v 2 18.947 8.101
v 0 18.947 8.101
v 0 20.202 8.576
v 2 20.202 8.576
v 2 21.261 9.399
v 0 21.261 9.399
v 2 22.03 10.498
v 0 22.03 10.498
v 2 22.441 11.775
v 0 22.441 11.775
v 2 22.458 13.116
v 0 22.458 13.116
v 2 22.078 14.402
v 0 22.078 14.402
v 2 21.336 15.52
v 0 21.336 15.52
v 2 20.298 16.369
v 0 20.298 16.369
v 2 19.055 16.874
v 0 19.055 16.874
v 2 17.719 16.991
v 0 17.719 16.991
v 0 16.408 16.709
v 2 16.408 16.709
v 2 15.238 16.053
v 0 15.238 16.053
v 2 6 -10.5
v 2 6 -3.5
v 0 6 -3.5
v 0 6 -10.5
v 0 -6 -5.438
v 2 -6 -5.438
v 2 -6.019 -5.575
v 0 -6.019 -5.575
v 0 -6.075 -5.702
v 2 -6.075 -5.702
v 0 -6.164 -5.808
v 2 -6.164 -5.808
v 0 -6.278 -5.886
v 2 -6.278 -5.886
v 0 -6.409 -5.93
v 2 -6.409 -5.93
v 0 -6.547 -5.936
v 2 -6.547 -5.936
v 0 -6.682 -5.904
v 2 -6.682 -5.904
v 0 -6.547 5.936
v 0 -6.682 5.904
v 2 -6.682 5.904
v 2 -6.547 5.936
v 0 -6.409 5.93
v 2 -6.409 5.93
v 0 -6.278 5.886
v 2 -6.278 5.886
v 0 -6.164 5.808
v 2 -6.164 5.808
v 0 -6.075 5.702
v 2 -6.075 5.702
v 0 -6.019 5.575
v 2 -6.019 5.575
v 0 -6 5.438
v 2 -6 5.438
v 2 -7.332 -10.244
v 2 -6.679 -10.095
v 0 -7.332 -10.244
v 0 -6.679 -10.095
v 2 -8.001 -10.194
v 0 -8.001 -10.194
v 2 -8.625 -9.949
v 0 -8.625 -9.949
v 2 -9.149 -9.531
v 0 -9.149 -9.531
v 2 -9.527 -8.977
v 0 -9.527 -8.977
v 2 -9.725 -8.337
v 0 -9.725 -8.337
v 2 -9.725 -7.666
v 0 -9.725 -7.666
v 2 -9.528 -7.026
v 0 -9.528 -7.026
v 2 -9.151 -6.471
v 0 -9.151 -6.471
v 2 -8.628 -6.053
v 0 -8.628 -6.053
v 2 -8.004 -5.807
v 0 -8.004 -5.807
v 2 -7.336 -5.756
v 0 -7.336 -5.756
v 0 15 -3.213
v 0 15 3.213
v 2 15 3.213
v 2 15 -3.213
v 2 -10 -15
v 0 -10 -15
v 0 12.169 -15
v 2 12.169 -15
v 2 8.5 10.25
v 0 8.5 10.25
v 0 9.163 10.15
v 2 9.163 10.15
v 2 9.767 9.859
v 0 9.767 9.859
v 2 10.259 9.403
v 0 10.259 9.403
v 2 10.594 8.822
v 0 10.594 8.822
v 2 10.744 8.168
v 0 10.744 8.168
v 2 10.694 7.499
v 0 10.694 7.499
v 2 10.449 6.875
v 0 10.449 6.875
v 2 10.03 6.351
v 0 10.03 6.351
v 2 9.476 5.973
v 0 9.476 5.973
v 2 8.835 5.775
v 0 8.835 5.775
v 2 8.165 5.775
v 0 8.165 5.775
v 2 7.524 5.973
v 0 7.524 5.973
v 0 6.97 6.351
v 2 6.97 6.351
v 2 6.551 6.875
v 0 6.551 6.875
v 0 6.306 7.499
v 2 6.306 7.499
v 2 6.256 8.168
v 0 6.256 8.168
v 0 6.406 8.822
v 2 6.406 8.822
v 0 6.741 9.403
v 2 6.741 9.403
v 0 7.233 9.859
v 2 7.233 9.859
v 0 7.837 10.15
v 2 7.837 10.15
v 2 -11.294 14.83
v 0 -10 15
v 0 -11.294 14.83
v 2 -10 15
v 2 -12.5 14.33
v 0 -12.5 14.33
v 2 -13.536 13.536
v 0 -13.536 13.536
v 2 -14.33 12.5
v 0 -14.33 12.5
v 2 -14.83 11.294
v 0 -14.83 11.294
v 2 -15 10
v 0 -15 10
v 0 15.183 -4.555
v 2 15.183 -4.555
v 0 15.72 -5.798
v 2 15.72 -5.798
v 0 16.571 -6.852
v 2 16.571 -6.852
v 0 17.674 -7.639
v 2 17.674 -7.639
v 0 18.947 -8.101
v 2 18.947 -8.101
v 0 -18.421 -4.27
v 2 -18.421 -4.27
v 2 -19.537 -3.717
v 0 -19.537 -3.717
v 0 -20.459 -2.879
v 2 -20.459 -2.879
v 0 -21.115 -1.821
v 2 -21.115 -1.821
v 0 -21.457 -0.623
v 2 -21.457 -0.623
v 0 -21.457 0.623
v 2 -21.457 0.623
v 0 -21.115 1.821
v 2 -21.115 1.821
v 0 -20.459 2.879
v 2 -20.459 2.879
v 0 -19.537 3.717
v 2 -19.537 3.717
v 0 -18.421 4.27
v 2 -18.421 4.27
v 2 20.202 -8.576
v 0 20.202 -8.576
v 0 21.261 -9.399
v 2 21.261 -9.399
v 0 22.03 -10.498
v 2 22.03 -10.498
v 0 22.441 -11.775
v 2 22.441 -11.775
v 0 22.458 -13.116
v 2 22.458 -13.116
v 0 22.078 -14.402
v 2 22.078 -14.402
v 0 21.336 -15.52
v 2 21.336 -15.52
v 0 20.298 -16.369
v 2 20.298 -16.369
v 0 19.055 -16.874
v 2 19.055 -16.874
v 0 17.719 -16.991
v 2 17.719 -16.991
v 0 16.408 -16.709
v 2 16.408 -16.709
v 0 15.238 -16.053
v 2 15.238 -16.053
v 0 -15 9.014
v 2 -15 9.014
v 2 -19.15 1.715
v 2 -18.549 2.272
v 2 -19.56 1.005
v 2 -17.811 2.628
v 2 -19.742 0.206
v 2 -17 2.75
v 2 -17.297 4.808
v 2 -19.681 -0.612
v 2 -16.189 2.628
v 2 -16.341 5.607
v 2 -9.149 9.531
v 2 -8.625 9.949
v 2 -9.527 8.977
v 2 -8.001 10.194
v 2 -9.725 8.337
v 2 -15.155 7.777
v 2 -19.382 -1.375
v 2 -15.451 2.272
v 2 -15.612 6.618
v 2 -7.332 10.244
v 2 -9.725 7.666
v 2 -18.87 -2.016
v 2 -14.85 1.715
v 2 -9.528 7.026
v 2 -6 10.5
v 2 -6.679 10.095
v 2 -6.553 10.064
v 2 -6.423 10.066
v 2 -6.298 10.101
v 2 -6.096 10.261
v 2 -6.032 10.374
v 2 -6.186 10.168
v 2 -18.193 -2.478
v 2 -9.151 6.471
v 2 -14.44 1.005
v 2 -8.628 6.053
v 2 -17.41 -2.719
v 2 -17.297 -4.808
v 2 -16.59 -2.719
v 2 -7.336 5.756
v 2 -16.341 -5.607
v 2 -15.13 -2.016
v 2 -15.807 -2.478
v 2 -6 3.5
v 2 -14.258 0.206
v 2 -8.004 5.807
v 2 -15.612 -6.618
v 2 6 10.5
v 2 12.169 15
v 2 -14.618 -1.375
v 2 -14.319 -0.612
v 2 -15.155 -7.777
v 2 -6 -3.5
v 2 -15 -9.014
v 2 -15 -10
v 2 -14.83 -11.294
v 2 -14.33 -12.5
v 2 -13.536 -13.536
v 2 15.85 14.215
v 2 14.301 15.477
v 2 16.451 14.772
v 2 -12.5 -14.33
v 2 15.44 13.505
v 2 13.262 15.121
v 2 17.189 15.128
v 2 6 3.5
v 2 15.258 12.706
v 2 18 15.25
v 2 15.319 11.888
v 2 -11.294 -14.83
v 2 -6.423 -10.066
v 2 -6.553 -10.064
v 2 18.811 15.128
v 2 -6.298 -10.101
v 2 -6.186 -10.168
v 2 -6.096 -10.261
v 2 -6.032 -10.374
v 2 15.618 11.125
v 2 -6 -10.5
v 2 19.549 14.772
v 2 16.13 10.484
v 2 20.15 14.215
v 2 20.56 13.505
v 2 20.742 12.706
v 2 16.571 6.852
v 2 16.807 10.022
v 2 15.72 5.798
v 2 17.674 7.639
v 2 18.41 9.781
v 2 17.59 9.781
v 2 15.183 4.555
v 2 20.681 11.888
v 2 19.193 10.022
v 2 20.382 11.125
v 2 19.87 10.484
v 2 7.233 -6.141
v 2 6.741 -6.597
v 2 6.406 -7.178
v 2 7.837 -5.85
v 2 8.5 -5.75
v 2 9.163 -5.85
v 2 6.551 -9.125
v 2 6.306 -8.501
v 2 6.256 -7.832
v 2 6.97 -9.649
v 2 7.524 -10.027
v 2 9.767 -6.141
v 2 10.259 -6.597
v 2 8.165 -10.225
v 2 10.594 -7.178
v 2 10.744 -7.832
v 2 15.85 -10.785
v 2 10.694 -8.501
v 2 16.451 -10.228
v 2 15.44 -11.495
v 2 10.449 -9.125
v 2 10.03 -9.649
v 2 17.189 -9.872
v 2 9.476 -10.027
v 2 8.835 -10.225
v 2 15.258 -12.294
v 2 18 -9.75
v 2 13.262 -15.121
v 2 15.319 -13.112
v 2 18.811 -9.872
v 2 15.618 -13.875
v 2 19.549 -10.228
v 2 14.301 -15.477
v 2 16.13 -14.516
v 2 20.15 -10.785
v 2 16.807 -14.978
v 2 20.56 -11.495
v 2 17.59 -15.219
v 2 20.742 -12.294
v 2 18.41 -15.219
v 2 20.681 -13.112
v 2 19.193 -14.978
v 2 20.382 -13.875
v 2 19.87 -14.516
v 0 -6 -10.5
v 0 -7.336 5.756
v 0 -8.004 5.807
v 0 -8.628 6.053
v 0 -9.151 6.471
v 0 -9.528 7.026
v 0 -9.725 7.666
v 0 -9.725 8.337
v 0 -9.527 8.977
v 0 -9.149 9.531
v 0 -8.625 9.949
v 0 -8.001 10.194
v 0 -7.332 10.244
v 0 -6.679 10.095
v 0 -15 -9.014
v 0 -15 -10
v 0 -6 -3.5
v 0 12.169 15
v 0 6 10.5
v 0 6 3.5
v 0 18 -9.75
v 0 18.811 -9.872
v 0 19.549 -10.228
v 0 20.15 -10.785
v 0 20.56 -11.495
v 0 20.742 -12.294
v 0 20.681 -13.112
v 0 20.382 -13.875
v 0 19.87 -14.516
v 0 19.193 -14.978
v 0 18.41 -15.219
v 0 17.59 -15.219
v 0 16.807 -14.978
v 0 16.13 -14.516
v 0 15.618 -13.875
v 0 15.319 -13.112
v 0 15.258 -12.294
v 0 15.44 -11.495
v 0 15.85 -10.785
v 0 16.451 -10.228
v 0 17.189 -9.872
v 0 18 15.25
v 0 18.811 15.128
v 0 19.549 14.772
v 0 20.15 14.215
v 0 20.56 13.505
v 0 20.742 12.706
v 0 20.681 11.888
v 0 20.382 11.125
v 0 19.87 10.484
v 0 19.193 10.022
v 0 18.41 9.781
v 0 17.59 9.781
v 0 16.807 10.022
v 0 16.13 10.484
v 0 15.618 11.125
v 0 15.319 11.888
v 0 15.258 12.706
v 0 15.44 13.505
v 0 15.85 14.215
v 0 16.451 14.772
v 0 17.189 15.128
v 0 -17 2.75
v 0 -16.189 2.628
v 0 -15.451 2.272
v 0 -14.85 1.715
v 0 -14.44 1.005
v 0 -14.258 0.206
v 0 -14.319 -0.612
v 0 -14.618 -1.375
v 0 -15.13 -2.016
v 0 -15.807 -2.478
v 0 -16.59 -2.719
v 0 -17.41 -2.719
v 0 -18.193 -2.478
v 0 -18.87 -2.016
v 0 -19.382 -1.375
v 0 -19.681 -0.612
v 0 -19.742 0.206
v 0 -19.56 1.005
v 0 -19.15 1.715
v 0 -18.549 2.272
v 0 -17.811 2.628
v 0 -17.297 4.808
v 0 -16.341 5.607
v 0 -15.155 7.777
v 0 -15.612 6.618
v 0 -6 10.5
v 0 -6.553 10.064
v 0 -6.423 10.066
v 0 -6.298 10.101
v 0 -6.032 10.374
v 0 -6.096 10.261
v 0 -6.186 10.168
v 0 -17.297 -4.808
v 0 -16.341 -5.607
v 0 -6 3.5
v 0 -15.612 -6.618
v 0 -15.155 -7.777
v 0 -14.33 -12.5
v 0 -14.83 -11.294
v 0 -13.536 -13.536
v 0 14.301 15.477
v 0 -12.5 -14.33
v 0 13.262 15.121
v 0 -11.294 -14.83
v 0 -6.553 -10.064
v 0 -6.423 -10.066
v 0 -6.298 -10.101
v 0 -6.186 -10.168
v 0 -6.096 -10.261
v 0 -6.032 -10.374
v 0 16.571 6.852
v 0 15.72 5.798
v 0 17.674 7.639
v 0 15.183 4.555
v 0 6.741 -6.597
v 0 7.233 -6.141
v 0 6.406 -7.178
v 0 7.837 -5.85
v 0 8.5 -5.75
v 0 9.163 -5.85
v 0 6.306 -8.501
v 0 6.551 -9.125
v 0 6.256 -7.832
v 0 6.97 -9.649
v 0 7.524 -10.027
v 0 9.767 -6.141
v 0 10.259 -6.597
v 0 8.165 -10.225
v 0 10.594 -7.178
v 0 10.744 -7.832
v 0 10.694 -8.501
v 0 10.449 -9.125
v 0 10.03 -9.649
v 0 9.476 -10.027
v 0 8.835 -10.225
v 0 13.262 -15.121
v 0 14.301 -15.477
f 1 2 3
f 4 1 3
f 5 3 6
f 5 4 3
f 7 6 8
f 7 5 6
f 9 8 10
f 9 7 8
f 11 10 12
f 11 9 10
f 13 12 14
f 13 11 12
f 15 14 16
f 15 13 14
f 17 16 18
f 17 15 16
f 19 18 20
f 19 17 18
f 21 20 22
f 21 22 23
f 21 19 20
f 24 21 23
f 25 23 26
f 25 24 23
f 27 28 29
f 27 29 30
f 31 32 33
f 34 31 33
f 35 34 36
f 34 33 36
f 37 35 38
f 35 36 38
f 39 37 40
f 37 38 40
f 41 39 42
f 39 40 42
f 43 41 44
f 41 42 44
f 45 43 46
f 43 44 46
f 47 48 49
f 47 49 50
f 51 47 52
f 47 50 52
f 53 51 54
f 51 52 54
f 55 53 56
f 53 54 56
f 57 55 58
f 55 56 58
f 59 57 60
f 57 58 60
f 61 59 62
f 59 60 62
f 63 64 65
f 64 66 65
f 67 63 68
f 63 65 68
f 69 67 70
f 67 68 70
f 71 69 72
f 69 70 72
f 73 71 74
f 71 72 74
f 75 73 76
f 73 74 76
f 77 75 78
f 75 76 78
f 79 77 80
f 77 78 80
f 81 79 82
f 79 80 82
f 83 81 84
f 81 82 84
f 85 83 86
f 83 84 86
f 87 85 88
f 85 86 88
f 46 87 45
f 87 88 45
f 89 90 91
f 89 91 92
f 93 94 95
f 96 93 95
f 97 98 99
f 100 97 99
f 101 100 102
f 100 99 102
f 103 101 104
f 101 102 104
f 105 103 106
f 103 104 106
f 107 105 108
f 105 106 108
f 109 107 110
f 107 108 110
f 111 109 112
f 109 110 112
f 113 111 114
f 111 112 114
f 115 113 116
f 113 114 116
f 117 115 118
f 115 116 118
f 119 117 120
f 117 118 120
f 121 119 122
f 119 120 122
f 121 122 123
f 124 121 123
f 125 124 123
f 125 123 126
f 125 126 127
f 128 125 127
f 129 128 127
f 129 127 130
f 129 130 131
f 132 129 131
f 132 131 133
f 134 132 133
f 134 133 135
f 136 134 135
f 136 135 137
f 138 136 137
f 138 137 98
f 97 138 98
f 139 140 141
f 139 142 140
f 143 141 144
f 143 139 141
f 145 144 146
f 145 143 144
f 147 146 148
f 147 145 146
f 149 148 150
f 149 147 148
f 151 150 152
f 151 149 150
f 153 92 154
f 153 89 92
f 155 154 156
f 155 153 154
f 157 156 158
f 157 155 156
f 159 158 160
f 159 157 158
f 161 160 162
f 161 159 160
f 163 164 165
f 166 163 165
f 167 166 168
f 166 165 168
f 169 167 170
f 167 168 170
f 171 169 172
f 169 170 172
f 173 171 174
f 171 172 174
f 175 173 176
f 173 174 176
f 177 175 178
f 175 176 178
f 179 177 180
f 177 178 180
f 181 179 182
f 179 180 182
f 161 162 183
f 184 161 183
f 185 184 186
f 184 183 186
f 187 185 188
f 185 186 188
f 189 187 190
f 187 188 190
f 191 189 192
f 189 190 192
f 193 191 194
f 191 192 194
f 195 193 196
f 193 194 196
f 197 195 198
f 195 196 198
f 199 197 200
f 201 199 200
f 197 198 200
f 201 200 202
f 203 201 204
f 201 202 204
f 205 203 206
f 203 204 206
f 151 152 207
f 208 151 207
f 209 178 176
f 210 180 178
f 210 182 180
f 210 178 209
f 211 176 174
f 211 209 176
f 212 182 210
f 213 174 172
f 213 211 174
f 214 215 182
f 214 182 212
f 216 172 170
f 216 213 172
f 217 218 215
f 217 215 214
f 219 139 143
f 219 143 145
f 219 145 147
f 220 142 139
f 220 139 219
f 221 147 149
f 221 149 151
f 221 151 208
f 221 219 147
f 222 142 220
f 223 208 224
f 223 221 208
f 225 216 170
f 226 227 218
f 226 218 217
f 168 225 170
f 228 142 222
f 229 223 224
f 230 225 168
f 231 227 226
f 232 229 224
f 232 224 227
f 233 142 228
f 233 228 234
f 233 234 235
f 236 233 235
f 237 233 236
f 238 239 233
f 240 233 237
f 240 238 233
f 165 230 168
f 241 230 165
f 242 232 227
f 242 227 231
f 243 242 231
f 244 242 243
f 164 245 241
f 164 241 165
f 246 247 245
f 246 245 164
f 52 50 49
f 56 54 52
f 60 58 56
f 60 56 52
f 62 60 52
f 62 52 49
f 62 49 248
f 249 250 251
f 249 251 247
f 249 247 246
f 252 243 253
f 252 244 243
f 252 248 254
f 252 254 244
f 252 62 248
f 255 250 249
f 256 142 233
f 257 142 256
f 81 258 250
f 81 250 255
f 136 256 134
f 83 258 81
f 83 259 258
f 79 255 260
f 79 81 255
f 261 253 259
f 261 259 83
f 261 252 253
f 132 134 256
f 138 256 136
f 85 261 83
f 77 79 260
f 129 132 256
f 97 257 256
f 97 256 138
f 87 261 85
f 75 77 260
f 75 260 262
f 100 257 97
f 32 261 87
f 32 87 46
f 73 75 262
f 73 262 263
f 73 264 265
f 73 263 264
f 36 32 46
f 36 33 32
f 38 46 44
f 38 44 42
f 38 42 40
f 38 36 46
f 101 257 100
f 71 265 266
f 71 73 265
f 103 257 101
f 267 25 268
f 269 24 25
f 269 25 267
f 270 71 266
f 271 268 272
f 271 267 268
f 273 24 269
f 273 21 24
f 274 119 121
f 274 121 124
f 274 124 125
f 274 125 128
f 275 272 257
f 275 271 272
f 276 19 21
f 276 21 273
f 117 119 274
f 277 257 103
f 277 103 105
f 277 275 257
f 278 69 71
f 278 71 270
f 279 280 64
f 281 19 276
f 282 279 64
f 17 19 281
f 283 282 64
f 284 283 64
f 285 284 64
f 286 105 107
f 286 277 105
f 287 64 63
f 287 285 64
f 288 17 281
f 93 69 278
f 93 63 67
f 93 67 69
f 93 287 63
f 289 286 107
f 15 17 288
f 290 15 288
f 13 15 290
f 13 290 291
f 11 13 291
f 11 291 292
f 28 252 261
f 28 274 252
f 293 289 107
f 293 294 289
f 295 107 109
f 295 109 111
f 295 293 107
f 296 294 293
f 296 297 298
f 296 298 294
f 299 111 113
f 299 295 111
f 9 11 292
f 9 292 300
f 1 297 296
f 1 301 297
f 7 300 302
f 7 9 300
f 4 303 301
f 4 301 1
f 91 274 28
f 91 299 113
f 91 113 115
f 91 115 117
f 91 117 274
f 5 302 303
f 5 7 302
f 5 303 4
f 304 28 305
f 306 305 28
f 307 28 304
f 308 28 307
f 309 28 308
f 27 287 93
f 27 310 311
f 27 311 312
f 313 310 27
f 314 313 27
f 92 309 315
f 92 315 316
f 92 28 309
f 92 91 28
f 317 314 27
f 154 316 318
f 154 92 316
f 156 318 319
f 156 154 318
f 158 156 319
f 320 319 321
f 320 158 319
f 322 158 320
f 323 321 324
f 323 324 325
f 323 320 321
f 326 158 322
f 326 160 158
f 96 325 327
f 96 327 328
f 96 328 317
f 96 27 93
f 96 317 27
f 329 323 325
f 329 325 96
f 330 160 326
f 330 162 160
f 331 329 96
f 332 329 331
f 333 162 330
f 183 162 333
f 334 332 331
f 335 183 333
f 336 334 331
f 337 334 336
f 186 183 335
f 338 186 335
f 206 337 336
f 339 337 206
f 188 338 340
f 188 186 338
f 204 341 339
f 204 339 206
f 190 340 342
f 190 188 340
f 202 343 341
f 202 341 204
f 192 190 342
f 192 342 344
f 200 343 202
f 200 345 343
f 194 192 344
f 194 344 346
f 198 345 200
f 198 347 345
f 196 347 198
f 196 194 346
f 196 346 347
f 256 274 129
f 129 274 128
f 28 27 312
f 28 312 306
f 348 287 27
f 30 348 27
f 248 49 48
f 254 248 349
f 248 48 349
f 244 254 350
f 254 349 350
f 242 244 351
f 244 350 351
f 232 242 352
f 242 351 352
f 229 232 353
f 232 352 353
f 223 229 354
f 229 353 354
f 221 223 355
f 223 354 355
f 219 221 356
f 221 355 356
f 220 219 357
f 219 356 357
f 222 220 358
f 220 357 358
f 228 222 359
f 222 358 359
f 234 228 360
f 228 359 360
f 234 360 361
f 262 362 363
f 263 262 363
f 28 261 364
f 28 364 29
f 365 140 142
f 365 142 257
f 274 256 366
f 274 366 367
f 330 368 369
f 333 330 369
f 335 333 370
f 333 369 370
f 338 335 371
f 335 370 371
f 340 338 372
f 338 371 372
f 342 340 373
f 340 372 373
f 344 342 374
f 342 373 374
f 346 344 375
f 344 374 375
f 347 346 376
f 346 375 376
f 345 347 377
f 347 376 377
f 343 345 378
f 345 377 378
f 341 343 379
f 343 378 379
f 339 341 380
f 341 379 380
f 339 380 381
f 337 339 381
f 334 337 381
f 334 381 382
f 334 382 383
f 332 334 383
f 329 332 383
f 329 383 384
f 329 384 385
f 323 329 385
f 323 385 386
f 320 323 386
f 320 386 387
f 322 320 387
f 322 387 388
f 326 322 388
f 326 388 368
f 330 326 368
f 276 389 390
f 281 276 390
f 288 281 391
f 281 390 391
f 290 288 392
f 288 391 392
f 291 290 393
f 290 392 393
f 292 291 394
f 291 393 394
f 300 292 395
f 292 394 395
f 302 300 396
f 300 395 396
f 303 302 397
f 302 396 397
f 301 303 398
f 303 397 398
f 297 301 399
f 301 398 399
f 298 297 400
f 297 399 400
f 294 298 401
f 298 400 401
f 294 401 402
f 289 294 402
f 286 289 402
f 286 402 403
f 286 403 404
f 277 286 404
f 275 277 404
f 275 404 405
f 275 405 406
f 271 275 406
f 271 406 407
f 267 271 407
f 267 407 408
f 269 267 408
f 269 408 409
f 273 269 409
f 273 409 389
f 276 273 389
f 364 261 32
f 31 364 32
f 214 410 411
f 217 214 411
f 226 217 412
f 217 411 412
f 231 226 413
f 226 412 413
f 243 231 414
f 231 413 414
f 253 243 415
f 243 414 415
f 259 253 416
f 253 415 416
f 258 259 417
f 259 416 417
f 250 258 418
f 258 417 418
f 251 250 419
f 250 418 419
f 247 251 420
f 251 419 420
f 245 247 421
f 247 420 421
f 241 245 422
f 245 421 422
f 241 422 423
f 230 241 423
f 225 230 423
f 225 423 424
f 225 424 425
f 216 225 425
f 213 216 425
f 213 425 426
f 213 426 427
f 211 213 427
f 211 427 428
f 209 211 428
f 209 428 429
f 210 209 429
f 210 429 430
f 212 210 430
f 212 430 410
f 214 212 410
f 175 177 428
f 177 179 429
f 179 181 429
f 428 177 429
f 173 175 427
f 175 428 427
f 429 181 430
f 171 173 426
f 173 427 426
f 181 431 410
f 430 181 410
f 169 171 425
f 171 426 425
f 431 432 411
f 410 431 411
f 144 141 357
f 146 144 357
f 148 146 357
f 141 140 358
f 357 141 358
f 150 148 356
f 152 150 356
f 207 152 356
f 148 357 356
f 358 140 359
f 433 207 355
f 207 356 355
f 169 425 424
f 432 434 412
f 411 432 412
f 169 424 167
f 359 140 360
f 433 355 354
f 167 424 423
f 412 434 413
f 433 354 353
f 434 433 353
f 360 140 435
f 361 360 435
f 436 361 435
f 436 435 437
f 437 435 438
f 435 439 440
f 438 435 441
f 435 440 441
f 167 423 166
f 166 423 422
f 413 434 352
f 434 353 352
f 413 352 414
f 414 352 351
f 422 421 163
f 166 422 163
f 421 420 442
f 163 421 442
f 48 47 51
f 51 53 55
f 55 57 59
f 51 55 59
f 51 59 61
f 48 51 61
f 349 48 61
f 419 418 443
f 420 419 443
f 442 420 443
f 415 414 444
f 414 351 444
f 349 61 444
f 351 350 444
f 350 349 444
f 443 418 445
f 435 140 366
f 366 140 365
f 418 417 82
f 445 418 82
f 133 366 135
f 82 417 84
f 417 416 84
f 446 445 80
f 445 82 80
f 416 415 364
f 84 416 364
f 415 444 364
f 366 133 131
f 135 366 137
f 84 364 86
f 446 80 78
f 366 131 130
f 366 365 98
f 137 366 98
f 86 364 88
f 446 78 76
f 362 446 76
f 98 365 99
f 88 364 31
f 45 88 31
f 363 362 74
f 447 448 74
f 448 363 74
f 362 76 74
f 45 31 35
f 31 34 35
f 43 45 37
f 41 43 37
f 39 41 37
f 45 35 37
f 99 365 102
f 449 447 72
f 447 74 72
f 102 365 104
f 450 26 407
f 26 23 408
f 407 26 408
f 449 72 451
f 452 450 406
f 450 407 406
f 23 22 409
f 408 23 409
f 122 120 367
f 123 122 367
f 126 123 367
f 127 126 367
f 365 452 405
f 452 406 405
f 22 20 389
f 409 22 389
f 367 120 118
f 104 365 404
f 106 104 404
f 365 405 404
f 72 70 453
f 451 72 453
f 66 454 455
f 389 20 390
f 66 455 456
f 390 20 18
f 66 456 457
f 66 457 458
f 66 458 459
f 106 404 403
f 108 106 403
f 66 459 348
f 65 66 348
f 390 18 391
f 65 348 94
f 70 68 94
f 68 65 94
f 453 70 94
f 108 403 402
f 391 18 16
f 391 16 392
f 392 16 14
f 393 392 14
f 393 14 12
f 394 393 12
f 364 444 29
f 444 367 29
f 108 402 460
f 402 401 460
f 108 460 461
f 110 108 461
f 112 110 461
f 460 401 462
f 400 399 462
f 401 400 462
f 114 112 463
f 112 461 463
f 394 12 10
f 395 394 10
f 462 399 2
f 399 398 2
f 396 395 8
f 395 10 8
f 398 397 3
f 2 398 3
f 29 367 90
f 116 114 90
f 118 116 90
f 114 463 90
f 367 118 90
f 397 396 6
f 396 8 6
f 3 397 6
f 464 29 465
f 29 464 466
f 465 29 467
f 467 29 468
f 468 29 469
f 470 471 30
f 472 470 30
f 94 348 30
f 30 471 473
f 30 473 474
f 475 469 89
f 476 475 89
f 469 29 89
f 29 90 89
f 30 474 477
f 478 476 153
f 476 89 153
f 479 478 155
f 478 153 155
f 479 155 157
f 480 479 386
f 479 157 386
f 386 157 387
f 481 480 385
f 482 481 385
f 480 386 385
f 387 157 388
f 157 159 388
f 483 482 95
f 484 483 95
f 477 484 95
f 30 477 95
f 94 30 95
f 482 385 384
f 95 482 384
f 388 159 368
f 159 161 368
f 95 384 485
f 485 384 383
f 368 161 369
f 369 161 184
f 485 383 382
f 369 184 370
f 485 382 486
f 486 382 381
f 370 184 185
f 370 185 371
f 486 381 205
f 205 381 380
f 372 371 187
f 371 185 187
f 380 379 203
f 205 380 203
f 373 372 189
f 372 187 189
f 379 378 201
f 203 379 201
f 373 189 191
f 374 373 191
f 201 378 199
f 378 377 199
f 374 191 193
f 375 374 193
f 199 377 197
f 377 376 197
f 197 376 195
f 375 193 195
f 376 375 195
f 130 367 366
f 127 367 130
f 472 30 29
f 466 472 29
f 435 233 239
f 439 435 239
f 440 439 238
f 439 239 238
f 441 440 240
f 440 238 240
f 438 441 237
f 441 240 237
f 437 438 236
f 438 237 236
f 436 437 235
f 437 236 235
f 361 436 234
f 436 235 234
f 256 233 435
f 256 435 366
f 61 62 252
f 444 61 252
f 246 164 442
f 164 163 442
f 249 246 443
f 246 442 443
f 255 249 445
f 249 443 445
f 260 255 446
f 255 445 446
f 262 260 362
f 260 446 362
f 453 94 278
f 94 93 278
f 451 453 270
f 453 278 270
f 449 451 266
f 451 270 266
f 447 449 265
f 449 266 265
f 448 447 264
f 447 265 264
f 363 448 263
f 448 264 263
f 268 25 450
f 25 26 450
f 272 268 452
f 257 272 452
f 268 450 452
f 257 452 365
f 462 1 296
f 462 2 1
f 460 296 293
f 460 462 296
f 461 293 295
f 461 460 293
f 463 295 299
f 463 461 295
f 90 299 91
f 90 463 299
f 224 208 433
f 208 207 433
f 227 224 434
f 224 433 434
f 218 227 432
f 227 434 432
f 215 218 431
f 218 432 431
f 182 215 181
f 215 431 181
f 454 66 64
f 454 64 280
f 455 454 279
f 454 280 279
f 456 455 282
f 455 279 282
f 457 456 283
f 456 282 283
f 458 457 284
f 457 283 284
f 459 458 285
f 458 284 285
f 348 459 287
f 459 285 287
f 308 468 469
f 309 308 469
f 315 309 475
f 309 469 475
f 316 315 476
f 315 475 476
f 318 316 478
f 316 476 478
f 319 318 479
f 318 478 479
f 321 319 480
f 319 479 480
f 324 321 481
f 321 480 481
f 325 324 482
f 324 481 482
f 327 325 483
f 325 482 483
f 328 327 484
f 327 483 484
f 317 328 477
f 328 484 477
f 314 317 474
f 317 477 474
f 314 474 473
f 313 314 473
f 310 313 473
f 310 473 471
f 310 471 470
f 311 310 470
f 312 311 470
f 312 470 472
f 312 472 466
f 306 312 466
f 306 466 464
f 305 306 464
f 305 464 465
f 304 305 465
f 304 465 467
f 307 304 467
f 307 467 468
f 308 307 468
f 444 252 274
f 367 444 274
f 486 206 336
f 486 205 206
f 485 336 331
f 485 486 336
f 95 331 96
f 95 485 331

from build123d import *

# Parameters (mm, degrees)
SKETCH1_W            = 30
SKETCH1_H            = 30
BOSS_EXTRUDE1_DEPTH  = 2
SKETCH2_W            = 7
SKETCH2_H            = 12
CUT_EXTRUDE1_DEPTH   = 22.307275753
M4_CLEARANCE_HOLE1_D = 4.5
BOSS_EXTRUDE2_DEPTH  = 2
M5_CLEARANCE_HOLE1_D = 5.5
FILLET1_R            = 5
FILLET2_R            = 0.5


with BuildPart() as part:
    # Sketch1 → Boss-Extrude1 (new body)
    with BuildSketch(Plane(origin=(0, 0, 0), x_dir=(0, 0, -1), z_dir=(1, 0, 0))):
        Rectangle(SKETCH1_W, SKETCH1_H)
    extrude(amount=BOSS_EXTRUDE1_DEPTH)

    # Sketch2 → Cut-Extrude1 (cut, through all)
    with BuildSketch(Plane(origin=(2, 0, 0), x_dir=(0, 0, -1), z_dir=(1, 0, 0))):
        with Locations((-7, 0)):
            Rectangle(SKETCH2_W, SKETCH2_H)
        with Locations((7, 0)):
            Rectangle(SKETCH2_W, SKETCH2_H)
    extrude(amount=-CUT_EXTRUDE1_DEPTH, mode=Mode.SUBTRACT)

    # M4 Clearance Hole1 (through all)
    with Locations(Plane(origin=(2, 0, 0), x_dir=(0, 0, -1), z_dir=(1, 0, 0))):
        with Locations((-8, 8.5), (-8, -7.5), (8, 8.5), (8, -7.5)):
            Hole(M4_CLEARANCE_HOLE1_D / 2)

    # Sketch6 → Boss-Extrude2 (add)
    with BuildSketch(Plane(origin=(2, 0, 0), x_dir=(0, 0, -1), z_dir=(1, 0, 0))):
        with BuildLine():
            Line((-15, 14.258342613), (-15, 15))
            Line((-15, 15), (-9.145898034, 15))
            ThreePointArc((-9.145898034, 15), (-13.065585062, 22.464315573), (-15, 14.258342613))
        make_face()
        with BuildLine():
            Line((15, 14.258342613), (15, 15))
            Line((15, 15), (9.145898034, 15))
            ThreePointArc((9.145898034, 15), (13.065585062, 22.464315573), (15, 14.258342613))
        make_face()
        with BuildLine():
            Line((-4.031128874, -15), (4.031128874, -15))
            ThreePointArc((4.031128874, -15), (0, -21.5), (-4.031128874, -15))
        make_face()
    extrude(amount=-BOSS_EXTRUDE2_DEPTH)

    # M5 Clearance Hole1 (through all)
    with Locations(Plane(origin=(2, 0, 0), x_dir=(0, 0, -1), z_dir=(1, 0, 0))):
        with Locations((-12.5, 18), (12.5, 18), (0, -17)):
            Hole(M5_CLEARANCE_HOLE1_D / 2)

    # Fillet1
    fillet1_edges = [part.edges().sort_by_distance(p)[0] for p in [
        (1, -15, -15),
        (1, -15, 15),
        (1, 14.258342613, 15),
        (1, 15, 9.145898034),
        (1, 14.258342613, -15),
        (1, 15, -9.145898034),
        (1, -15, 4.031128874),
        (1, -15, -4.031128874),
    ]]
    fillet(fillet1_edges, radius=FILLET1_R)

    # Fillet2
    # the kernel refuses this fillet: 0.5 mm, written as the material it takes off along each edge
    with BuildSketch(Plane(origin=(4.211716771, -6, -6.322949017), x_dir=(0, 0, 1), z_dir=(-1, 0, 0))) as fillet2_piece_1:
        with BuildLine():
            CenterArc((0.884686708, -0.5), FILLET2_R, 90, 111.323686263)
            Line((0.418916219, -0.681818182), (0.409600809, -0.685454545))
            ThreePointArc((0.409600809, -0.685454545), (0.23149304, -0.327370599), (-0.00745356, -0.006666667))
            Line((-0.00745356, -0.006666667), (0, 0.01))
            Line((0, 0.01), (0.884686708, 0.01))
            Line((0.884686708, 0.01), (0.884686708, 0))
        make_face()
    extrude(amount=6.423433542, mode=Mode.SUBTRACT)
    with BuildSketch(Plane(origin=(4.057372542, -6, -9.677050983), x_dir=(0, -0.851655260409685, -0.5241023921110375), z_dir=(-1, 0, 0))) as fillet2_piece_2:
        with BuildLine():
            CenterArc((0.885636575, -0.492093973), FILLET2_R, 100.202478529, 104.477512186)
            Line((0.431309548, -0.700868859), (0.422223008, -0.705044357))
            ThreePointArc((0.422223008, -0.705044357), (0.207138222, -0.355675454), (-0.008516553, -0.005241024))
            Line((-0.008516553, -0.005241024), (0.001771273, 0.009841879))
            ThreePointArc((0.001771273, 0.009841879), (0.398536459, -0.02557712), (0.795301644, 0.009841879))
            Line((0.795301644, 0.009841879), (0.797072917, 0))
        make_face()
    extrude(amount=6.114745084, mode=Mode.SUBTRACT)
    with BuildSketch(Plane(origin=(4.057372542, -6, 9.677050983), x_dir=(0, 0, 1), z_dir=(-1, 0, 0))) as fillet2_piece_3:
        with BuildLine():
            CenterArc((0.883258668, -0.496349419), FILLET2_R, 96.927845653, 104.477512186)
            Line((0.417747823, -0.678831343), (0.408437606, -0.682480981))
            ThreePointArc((0.408437606, -0.682480981), (0.2306568, -0.326010642), (-0.00745356, -0.006666667))
            Line((-0.00745356, -0.006666667), (0, 0.01))
            ThreePointArc((0, 0.01), (0.411474508, 0.01), (0.821742824, 0.009926988))
            Line((0.821742824, 0.009926988), (0.822949017, 0))
        make_face()
    extrude(amount=6.114745084, mode=Mode.SUBTRACT)
    with BuildSketch(Plane(origin=(4.211716771, -6, 6.322949017), x_dir=(0, -0.8520285817760733, -0.5234952682084655), z_dir=(-1, 0, 0))) as fillet2_piece_4:
        with BuildLine():
            CenterArc((0.889143597, -0.492030727), FILLET2_R, 100.243314316, 111.323686264)
            Line((0.463129306, -0.753778361), (0.45460902, -0.759013314))
            Line((0.45460902, -0.759013314), (-0.008520286, -0.005234953))
            Line((-0.008520286, -0.005234953), (0.001778287, 0.009840615))
            ThreePointArc((0.001778287, 0.009840615), (0.400114618, -0.025861727), (0.79845095, 0.009840615))
            Line((0.79845095, 0.009840615), (0.800229237, 0))
        make_face()
    extrude(amount=6.423433542, mode=Mode.SUBTRACT)


solid = part.part
